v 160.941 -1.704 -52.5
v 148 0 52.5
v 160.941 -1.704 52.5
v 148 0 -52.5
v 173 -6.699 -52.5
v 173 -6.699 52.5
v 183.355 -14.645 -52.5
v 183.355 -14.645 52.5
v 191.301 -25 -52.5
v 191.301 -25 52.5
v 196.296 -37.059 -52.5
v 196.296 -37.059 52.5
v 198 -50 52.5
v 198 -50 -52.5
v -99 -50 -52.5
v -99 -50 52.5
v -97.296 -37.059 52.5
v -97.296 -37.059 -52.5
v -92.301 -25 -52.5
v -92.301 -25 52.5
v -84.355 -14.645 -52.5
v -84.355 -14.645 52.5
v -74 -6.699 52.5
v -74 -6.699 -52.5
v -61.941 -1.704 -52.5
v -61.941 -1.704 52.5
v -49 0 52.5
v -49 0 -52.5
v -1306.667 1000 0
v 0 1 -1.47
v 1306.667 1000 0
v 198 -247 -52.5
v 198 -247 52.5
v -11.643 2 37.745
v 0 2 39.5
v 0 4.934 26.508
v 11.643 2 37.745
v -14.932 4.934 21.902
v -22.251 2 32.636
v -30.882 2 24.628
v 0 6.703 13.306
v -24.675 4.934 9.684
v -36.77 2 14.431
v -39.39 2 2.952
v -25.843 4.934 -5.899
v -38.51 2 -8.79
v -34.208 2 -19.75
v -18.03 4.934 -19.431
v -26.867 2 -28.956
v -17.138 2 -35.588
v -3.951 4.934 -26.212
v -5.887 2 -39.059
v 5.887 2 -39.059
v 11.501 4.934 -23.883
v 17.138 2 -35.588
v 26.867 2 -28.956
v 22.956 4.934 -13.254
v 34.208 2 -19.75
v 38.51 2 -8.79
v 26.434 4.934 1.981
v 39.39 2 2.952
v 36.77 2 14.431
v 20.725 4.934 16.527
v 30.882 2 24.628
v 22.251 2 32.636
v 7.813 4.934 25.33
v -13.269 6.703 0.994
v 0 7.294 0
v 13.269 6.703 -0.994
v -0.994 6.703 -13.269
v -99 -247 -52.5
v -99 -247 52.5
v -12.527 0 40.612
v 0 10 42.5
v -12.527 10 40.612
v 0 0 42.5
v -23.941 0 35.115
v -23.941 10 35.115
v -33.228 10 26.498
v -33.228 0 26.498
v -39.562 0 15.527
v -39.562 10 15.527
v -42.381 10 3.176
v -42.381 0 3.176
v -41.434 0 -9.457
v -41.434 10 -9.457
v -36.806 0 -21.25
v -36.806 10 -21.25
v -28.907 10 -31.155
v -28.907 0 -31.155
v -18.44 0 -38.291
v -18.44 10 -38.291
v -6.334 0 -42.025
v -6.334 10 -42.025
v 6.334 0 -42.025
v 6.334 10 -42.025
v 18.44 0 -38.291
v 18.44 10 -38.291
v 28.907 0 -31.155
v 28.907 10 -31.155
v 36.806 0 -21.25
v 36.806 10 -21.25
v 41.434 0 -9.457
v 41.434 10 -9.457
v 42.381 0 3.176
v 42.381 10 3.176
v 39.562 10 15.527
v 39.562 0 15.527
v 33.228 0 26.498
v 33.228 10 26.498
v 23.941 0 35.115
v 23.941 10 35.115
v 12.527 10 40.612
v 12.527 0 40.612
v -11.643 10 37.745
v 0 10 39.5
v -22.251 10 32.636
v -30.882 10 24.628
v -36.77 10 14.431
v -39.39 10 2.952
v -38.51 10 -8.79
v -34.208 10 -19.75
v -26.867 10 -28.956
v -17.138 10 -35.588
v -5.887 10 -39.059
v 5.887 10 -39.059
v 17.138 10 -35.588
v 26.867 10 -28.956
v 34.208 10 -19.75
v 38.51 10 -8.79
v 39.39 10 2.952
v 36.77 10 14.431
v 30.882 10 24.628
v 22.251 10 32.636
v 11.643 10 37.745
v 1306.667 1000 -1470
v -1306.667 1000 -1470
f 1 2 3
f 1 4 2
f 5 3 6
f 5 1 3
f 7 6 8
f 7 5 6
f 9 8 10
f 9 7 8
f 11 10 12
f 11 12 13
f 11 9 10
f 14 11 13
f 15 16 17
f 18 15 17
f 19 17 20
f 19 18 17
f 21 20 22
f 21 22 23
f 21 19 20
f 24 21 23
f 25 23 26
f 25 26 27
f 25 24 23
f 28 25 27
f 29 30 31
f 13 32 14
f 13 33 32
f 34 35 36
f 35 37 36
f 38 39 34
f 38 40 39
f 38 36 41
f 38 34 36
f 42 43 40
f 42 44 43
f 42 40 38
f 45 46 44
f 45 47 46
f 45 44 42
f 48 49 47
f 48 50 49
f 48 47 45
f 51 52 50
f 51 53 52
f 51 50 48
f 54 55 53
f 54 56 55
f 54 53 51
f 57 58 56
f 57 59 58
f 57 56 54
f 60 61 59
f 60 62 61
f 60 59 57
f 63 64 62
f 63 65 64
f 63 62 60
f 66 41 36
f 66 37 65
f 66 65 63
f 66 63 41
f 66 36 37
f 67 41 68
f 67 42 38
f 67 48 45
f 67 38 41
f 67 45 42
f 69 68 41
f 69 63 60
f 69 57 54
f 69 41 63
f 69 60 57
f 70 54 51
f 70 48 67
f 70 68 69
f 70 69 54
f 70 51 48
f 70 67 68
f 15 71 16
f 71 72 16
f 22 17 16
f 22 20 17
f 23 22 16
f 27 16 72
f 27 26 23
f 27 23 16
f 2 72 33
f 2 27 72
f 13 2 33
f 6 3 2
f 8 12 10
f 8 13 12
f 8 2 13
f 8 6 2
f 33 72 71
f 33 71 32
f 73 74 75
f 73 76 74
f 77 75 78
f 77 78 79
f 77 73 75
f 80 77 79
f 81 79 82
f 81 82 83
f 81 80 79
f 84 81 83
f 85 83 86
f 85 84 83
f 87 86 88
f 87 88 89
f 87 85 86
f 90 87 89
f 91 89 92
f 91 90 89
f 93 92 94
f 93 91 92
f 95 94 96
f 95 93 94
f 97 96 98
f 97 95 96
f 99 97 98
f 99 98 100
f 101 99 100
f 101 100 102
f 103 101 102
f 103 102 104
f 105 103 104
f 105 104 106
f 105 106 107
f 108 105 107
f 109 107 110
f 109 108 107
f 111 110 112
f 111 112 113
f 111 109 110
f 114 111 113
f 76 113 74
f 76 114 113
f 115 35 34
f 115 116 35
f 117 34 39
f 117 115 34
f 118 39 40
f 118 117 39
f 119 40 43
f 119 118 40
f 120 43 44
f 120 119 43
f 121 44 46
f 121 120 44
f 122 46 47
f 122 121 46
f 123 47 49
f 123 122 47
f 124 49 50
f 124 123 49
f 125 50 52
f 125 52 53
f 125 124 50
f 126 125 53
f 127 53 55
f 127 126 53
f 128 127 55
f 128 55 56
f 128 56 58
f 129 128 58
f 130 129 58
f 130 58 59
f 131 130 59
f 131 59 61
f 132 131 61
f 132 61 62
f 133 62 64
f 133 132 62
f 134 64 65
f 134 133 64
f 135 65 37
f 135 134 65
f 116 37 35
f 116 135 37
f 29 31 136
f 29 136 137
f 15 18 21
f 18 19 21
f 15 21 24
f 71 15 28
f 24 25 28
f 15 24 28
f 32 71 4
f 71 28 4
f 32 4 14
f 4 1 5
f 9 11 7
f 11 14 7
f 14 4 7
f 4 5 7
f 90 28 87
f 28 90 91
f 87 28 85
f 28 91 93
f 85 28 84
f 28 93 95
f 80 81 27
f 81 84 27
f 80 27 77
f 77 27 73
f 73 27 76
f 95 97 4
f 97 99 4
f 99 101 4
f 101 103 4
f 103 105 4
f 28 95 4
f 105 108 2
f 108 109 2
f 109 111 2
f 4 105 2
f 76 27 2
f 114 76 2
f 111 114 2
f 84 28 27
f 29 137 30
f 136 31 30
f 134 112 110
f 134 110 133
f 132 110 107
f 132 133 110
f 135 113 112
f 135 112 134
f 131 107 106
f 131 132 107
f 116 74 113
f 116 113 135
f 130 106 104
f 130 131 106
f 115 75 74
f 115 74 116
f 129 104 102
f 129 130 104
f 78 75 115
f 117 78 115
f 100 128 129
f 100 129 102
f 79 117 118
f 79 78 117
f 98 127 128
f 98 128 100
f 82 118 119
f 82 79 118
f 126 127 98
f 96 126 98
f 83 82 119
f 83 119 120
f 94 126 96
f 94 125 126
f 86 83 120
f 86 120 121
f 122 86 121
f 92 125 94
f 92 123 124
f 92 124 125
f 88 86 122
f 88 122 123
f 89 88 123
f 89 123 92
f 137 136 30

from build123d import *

# Parameters (mm, degrees)
F0_W     = 297
F0_H     = 247
F1_DEPTH = 52.5
F4_R     = 50
F7_W     = 2613.333334
F7_H     = 1470


with BuildPart() as f1:
    # F0 (on Top) → F1 (new body, symmetric)
    with BuildSketch(Plane.XY):
        with Locations((49.5, -123.5)):
            Rectangle(F0_W, F0_H)
    extrude(amount=F1_DEPTH, both=True)

    # F2 (on Right) → F3 (revolve)
    with BuildSketch(Plane.YZ):
        with BuildLine():
            Line((0, 42.5), (0, 0))
            Line((0, 0), (7.294264, 0))
            ThreePointArc((7.294264, 0), (5.964807, 19.926611), (2, 39.5))
            Line((2, 39.5), (10, 39.5))
            Line((10, 39.5), (10, 42.5))
            Line((10, 42.5), (0, 42.5))
        make_face()
    revolve(axis=Axis((0, -134.959865, 0), (0, -1, 0)))

    # F4
    f4_edges = [f1.edges().sort_by_distance(p)[0] for p in [
        (198, 0, 0),
        (-99, 0, 0),
    ]]
    fillet(f4_edges, radius=F4_R)


with BuildPart() as f8:
    # F7 (on face) → F8 section 0
    with BuildSketch(Plane(origin=(0, 1000, 0), x_dir=(-1, 0, 0), z_dir=(0, 1, 0)), mode=Mode.PRIVATE) as f8_s0:
        with Locations((0, -735)):
            Rectangle(F7_W, F7_H)
    loft([f8_s0.sketch, Vertex(0, 1, -1.47)])


solid = Compound([f1.part, f8.part])
